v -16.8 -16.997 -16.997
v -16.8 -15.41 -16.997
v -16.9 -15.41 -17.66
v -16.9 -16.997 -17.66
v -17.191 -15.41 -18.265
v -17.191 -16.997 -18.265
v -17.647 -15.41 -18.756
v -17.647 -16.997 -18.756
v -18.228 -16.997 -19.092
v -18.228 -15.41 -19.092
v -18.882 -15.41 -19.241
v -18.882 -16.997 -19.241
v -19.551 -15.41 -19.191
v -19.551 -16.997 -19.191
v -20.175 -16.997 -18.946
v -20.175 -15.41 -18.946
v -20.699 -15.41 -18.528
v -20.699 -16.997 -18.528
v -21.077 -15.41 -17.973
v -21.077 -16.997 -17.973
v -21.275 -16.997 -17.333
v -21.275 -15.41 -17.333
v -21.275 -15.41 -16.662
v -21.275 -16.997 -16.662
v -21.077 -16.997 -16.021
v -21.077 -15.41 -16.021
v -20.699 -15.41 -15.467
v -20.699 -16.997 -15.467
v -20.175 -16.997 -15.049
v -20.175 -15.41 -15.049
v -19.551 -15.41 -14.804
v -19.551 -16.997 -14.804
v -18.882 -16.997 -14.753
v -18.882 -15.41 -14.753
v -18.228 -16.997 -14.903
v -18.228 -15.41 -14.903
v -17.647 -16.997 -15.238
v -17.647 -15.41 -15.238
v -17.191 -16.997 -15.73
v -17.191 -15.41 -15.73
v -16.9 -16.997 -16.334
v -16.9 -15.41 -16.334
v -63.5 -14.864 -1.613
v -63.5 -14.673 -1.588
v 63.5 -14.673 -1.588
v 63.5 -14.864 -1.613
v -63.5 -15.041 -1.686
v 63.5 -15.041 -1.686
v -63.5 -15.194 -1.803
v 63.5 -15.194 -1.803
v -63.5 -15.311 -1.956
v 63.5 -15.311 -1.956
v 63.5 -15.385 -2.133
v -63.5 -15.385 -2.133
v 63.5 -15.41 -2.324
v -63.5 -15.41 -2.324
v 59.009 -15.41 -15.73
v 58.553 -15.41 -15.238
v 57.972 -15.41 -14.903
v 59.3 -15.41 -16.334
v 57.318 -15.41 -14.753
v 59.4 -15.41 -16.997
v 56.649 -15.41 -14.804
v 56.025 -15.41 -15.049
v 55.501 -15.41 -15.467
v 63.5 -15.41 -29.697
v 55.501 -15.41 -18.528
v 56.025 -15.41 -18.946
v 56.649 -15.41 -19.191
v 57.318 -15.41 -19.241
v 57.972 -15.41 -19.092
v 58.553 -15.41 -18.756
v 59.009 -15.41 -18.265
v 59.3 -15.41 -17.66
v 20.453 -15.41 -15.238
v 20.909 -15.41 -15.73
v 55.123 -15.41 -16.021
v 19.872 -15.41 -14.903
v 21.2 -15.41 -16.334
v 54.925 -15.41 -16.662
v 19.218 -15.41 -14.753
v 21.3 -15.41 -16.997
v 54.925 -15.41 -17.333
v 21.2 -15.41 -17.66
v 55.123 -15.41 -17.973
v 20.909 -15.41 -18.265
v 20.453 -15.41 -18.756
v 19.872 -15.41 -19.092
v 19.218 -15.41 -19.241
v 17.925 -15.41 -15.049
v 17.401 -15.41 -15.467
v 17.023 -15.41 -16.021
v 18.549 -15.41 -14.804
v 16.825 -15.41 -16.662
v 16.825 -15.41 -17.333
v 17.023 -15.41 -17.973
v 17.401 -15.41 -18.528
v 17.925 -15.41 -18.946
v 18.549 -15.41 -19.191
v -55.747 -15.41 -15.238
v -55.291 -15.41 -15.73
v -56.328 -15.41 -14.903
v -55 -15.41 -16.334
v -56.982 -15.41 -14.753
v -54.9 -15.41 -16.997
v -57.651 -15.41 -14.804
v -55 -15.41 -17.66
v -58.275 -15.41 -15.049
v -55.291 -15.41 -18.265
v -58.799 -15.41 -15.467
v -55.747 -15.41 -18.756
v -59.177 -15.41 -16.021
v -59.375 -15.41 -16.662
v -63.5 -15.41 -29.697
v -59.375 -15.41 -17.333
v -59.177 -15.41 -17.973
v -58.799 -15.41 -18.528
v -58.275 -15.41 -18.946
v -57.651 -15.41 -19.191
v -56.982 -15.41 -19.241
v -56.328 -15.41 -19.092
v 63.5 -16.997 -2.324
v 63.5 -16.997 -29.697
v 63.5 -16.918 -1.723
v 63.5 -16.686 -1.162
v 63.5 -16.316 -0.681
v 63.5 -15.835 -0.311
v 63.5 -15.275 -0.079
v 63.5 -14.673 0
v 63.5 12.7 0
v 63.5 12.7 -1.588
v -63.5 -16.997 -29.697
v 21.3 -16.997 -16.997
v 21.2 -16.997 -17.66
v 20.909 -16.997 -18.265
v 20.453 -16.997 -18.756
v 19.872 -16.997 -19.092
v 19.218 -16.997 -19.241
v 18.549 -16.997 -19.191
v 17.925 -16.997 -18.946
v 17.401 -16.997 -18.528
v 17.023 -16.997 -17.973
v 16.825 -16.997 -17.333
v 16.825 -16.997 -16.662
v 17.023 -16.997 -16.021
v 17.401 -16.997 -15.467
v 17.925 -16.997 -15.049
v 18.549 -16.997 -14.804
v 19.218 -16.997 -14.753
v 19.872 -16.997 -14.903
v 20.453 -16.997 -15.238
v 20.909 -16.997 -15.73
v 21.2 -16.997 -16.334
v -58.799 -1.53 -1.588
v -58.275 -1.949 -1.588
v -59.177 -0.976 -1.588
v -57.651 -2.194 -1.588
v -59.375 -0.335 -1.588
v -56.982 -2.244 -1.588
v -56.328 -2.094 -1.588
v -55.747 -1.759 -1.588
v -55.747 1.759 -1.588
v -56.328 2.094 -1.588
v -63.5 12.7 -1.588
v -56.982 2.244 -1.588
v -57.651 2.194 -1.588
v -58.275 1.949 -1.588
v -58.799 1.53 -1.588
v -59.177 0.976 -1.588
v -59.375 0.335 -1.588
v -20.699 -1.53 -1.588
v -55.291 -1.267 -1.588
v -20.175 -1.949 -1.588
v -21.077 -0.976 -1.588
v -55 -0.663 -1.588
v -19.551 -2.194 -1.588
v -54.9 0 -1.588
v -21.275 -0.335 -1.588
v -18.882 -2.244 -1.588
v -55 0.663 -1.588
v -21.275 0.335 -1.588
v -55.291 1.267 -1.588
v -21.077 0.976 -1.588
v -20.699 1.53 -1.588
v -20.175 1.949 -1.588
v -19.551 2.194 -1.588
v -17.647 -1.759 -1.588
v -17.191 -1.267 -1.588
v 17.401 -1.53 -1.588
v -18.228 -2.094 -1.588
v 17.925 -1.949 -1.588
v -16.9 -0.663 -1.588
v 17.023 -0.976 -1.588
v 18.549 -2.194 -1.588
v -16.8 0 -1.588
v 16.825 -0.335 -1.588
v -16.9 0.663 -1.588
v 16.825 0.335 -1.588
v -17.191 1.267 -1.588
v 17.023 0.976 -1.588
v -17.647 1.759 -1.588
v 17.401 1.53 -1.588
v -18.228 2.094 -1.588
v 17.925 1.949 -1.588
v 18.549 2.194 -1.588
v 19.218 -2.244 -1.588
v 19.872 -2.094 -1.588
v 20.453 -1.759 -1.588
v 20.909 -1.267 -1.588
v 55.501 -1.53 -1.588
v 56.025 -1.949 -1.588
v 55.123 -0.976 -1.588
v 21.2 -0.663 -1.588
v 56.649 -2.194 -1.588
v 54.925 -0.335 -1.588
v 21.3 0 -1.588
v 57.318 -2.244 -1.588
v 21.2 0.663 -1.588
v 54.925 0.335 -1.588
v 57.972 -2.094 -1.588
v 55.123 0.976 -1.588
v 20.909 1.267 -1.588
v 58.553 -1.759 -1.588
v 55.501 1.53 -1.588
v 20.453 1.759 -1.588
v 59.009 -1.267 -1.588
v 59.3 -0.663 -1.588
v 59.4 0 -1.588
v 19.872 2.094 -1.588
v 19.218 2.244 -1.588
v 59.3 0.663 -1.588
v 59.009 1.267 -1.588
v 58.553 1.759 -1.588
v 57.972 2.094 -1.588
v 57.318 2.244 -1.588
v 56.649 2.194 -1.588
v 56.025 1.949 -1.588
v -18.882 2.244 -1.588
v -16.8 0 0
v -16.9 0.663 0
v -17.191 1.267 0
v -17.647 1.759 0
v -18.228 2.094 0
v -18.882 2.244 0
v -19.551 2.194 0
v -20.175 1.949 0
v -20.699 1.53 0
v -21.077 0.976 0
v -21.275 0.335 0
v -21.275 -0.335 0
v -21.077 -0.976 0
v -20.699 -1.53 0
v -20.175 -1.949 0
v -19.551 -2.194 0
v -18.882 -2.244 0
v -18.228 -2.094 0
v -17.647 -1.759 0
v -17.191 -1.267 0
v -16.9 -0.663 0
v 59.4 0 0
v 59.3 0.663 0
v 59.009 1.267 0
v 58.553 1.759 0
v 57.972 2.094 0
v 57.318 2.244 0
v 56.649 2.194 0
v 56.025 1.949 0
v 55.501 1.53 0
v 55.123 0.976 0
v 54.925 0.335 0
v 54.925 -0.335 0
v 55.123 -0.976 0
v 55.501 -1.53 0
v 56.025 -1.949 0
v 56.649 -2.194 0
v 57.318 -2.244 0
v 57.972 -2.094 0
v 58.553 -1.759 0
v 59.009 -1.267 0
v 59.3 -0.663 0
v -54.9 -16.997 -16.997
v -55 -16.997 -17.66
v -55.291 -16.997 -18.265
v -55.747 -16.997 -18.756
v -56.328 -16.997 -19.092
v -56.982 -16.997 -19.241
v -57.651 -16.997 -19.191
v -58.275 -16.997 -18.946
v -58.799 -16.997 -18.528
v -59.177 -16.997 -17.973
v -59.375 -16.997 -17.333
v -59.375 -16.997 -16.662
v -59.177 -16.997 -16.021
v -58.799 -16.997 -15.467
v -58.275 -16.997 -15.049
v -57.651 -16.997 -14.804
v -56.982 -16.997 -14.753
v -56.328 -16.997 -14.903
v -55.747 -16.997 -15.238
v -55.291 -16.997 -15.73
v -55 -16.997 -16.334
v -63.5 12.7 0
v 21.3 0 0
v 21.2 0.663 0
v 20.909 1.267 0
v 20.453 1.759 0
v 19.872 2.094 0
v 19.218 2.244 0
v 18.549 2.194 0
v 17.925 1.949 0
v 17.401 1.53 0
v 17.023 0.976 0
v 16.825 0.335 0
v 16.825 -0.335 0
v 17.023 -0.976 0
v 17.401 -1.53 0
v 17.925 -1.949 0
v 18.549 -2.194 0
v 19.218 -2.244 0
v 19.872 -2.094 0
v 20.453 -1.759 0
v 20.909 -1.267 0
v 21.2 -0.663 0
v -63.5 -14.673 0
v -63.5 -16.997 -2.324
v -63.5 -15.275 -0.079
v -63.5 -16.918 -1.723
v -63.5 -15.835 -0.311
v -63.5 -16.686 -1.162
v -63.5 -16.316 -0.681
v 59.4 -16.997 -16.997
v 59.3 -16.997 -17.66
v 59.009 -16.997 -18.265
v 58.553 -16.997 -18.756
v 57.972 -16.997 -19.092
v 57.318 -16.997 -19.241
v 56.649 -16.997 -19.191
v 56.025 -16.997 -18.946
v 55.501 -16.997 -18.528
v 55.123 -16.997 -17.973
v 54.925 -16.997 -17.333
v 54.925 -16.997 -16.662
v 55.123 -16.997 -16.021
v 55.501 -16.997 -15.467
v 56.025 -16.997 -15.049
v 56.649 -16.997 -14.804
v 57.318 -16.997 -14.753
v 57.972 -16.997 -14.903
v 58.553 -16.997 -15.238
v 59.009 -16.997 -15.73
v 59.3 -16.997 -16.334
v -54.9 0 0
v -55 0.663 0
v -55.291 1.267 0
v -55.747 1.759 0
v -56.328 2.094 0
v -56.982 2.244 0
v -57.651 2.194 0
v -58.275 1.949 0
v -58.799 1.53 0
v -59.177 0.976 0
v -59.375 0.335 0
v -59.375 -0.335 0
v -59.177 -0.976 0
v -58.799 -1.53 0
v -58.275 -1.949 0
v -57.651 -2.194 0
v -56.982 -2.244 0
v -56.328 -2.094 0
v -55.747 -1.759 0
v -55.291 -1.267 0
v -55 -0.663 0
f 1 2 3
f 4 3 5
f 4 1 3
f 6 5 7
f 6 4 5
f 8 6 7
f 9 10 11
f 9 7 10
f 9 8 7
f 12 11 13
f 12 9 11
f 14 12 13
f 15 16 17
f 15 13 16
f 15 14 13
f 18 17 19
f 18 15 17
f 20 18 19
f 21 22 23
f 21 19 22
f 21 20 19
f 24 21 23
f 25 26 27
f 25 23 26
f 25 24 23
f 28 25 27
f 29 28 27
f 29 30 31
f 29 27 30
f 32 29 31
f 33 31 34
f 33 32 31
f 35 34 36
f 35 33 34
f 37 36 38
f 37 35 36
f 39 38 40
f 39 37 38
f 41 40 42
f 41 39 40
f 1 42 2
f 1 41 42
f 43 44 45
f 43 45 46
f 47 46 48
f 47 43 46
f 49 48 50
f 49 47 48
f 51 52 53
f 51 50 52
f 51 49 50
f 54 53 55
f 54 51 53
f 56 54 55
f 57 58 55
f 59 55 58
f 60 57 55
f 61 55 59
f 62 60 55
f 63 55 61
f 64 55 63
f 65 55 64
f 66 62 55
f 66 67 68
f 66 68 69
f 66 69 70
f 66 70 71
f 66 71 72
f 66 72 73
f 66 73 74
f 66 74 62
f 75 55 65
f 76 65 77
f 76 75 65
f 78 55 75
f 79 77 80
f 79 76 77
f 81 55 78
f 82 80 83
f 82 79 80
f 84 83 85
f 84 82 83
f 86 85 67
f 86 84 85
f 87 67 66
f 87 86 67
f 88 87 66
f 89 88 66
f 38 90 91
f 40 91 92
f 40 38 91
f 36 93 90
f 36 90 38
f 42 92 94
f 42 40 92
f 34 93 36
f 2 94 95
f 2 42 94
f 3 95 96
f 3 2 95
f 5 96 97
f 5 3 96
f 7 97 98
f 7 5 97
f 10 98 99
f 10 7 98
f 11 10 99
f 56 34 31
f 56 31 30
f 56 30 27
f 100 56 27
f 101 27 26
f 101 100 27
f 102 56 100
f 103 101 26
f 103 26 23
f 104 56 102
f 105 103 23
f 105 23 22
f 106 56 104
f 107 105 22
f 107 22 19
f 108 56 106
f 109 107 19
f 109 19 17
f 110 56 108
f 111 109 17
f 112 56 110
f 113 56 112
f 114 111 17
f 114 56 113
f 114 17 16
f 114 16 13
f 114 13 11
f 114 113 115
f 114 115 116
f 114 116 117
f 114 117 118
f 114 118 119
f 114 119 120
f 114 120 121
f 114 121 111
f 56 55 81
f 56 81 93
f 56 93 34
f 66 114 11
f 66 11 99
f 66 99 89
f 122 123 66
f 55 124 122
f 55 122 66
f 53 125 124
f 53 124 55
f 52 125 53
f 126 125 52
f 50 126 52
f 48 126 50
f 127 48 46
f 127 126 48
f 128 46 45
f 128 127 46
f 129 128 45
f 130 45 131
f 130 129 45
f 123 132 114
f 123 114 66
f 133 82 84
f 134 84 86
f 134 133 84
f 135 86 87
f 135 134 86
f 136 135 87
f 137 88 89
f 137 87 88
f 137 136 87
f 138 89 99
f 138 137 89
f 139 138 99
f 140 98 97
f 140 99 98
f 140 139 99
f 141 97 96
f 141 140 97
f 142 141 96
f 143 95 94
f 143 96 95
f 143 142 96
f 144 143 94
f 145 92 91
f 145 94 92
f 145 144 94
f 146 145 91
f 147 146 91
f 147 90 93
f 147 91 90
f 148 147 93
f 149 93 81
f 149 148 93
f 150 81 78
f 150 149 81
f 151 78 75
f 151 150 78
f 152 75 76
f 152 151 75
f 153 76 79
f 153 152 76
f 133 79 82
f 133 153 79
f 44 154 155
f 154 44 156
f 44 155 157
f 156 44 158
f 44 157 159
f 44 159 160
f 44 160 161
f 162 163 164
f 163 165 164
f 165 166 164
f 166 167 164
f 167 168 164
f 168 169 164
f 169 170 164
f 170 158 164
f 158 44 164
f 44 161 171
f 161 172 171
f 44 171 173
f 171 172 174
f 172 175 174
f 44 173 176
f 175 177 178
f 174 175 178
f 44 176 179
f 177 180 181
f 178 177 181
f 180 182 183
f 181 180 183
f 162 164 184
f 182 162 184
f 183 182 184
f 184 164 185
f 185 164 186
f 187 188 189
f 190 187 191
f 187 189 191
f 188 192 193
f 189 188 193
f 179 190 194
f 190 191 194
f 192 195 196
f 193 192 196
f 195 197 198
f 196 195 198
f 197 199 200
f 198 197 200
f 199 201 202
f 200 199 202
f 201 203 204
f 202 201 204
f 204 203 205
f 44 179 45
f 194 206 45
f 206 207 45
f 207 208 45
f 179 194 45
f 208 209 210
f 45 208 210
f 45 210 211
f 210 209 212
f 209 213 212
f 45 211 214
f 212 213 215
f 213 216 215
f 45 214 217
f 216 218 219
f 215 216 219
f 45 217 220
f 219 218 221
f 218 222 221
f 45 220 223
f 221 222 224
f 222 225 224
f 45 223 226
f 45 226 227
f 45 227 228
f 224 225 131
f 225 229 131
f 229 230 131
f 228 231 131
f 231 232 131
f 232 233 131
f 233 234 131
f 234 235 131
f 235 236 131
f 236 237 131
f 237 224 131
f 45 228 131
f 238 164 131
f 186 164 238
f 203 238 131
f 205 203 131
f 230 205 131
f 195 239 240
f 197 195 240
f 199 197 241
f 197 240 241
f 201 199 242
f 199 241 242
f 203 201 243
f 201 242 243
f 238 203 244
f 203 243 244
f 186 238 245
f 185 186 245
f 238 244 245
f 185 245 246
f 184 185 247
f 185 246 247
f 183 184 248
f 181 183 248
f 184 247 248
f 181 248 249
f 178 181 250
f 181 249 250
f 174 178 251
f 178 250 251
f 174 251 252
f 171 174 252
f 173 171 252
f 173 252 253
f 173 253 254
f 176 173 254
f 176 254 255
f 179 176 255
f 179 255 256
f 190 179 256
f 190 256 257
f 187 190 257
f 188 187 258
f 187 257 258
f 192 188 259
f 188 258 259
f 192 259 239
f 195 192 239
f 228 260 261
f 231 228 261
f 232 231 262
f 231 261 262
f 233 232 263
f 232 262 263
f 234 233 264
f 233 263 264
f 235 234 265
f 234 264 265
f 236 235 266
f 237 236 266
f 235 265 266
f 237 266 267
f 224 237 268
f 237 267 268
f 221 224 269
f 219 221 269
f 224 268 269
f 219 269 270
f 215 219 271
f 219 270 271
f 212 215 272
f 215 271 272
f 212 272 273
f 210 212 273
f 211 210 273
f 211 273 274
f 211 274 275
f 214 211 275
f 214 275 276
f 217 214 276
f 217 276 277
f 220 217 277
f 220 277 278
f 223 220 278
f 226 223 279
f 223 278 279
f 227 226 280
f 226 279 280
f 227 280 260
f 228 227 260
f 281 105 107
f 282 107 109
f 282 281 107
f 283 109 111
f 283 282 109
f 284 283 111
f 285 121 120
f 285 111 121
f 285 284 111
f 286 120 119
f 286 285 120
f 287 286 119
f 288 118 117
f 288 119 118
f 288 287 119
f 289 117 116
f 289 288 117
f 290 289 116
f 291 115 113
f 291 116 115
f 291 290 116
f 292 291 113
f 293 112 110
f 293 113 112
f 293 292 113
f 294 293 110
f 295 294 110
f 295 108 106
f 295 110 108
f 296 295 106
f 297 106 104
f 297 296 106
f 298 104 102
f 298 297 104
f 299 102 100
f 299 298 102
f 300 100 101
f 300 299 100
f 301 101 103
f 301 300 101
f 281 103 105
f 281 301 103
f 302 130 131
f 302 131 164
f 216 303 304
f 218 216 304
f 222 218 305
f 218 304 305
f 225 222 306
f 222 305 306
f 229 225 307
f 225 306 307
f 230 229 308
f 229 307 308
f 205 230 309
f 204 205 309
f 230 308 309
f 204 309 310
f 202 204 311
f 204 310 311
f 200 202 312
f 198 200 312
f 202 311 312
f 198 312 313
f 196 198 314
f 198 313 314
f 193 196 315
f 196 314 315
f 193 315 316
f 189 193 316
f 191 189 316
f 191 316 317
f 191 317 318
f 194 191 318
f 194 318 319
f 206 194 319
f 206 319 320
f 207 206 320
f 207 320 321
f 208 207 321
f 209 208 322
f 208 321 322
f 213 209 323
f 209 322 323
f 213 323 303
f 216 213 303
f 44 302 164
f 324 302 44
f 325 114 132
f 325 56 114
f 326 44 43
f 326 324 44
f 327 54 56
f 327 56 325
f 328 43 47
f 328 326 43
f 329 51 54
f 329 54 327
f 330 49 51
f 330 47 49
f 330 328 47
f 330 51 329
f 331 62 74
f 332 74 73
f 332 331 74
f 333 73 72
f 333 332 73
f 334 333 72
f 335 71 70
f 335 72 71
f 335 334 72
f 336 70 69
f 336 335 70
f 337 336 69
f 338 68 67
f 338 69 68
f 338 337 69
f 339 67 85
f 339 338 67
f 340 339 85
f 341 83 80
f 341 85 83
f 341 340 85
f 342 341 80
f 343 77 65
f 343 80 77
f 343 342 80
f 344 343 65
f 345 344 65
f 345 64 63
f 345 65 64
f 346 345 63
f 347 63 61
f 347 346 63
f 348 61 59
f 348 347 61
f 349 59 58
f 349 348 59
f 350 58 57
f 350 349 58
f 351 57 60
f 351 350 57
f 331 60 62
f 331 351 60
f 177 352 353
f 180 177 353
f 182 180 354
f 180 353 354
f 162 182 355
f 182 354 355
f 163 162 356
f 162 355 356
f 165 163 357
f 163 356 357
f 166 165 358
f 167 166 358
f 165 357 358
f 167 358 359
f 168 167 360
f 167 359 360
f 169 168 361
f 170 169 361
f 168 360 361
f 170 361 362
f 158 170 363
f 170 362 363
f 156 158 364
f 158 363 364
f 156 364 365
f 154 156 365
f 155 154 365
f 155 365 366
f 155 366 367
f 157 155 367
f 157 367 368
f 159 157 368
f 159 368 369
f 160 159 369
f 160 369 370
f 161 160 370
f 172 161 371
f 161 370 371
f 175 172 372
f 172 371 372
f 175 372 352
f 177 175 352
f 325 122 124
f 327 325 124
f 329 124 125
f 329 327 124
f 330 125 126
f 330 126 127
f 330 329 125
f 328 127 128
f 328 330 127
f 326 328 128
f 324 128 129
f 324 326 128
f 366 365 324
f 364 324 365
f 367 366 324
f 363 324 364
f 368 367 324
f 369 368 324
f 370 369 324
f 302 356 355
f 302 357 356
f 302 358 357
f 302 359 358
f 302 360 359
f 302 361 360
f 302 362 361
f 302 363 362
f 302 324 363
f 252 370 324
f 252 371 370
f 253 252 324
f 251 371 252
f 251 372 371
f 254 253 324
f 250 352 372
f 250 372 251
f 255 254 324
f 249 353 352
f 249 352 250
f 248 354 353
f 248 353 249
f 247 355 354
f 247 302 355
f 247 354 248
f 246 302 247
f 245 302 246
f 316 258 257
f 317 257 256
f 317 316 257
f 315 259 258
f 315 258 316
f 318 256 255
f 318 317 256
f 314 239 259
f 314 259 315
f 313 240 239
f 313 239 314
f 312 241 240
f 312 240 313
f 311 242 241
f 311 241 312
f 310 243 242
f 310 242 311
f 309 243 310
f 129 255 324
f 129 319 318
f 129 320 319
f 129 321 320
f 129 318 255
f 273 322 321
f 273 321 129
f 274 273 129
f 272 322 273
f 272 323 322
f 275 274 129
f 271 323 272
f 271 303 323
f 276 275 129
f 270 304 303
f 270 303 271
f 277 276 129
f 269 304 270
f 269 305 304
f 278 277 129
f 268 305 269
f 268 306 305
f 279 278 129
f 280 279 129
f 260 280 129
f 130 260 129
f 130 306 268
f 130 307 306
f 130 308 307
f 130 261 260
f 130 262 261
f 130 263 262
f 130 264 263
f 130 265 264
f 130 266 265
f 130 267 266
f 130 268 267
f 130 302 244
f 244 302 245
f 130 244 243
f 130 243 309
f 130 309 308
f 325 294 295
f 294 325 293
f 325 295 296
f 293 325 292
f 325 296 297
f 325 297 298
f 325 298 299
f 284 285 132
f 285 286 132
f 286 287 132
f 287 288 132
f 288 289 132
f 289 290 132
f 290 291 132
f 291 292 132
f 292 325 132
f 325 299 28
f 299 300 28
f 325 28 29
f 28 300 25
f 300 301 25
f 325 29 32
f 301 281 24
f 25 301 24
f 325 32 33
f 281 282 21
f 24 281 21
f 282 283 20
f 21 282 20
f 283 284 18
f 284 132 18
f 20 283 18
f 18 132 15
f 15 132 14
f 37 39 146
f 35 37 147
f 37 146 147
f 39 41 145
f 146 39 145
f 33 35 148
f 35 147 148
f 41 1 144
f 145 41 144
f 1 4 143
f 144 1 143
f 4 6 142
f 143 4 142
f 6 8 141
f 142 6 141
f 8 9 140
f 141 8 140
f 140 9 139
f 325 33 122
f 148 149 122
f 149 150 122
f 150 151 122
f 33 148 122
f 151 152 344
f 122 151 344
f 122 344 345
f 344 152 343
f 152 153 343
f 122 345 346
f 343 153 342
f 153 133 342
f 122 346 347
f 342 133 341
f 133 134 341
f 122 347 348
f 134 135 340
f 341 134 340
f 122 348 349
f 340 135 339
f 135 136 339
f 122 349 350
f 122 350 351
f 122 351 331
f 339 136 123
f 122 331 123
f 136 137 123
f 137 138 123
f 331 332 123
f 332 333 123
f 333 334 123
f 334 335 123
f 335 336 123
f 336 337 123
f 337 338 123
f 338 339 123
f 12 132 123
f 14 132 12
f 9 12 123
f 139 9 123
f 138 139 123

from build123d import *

# Parameters (mm, degrees)
SKETCH1_R                  = 2.25
BASE_FLANGE1_DEPTH         = 1.5875
SKETCHED_START             = -44.45
SKETCHED_BEND1_OUTLINE_W   = 127
SKETCHED_BEND1_OUTLINE_H   = 1.5875
SKETCHED_BEND1_DEPTH       = 27.452834079
SKETCHED_START_2           = -16.777817363
SKETCHED_BEND1_2_OUTLINE_W = 127
SKETCHED_BEND1_2_OUTLINE_H = 28.109665921
SKETCHED_BEND1_2_OUTLINE_R = 2.25
SKETCHED_BEND1_2_DEPTH     = 1.368151442
SKETCHED_START_3           = -16.997165921
SKETCHED_BEND1_3_OUTLINE_W = 127
SKETCHED_BEND1_3_OUTLINE_H = 28.109665921
SKETCHED_BEND1_3_OUTLINE_R = 2.25
SKETCHED_BEND1_3_DEPTH     = 2.3241
SKETCHED_START_4           = -64
SKETCHED_BEND1_4_DEPTH     = 128


with BuildPart() as part:
    # Base-Flange1: sheet metal written as solids
    # Sketch1 → Base-Flange1 (new body)
    with BuildSketch(Plane.XY):
        Polygon((63.5, -12.7), (63.5, 12.7), (-63.5, 12.7), (-63.5, -12.7), (-63.5, -19.05), (-63.5, -44.45), (63.5, -44.45), (63.5, -19.05), align=None)
        with Locations((-57.15, 0)):
            Circle(SKETCH1_R, mode=Mode.SUBTRACT)
        with Locations((-19.05, 0)):
            Circle(SKETCH1_R, mode=Mode.SUBTRACT)
        with Locations((19.05, 0)):
            Circle(SKETCH1_R, mode=Mode.SUBTRACT)
        with Locations((57.15, 0)):
            Circle(SKETCH1_R, mode=Mode.SUBTRACT)
        with Locations(Location((57.15, -31.75, 0), (0, 0, 180))):
            Circle(SKETCH1_R, mode=Mode.SUBTRACT)
        with Locations(Location((19.05, -31.75, 0), (0, 0, 180))):
            Circle(SKETCH1_R, mode=Mode.SUBTRACT)
        with Locations(Location((-19.05, -31.75, 0), (0, 0, 180))):
            Circle(SKETCH1_R, mode=Mode.SUBTRACT)
        with Locations(Location((-57.15, -31.75, 0), (0, 0, 180))):
            Circle(SKETCH1_R, mode=Mode.SUBTRACT)
    extrude(amount=-BASE_FLANGE1_DEPTH)

    # Sketched Bend1: read off the stored shape, not the designer's step
    # Sketched Bend1 outline → Sketched Bend1 (cut)
    with BuildSketch(Plane(origin=(0, 0, 0), x_dir=(1, 0, 0), z_dir=(0, 1, 0)).offset(SKETCHED_START)):
        with Locations((0, 0.79375)):
            Rectangle(SKETCHED_BEND1_OUTLINE_W, SKETCHED_BEND1_OUTLINE_H)
    extrude(amount=SKETCHED_BEND1_DEPTH, mode=Mode.SUBTRACT)

    # Sketched Bend1 2 outline → Sketched Bend1 2 (add)
    with BuildSketch(Plane(origin=(0, 0, 0), x_dir=(1, 0, 0), z_dir=(0, 1, 0)).offset(SKETCHED_START_2)):
        with Locations((0, 15.642332961)):
            Rectangle(SKETCHED_BEND1_2_OUTLINE_W, SKETCHED_BEND1_2_OUTLINE_H)
        with Locations((-57.15, 16.997165921)):
            Circle(SKETCHED_BEND1_2_OUTLINE_R, mode=Mode.SUBTRACT)
        with Locations((-19.05, 16.997165921)):
            Circle(SKETCHED_BEND1_2_OUTLINE_R, mode=Mode.SUBTRACT)
        with Locations((19.05, 16.997165921)):
            Circle(SKETCHED_BEND1_2_OUTLINE_R, mode=Mode.SUBTRACT)
        with Locations((57.15, 16.997165921)):
            Circle(SKETCHED_BEND1_2_OUTLINE_R, mode=Mode.SUBTRACT)
    extrude(amount=SKETCHED_BEND1_2_DEPTH)

    # Sketched Bend1 3 outline → Sketched Bend1 3 (add)
    with BuildSketch(Plane(origin=(0, 0, 0), x_dir=(1, 0, 0), z_dir=(0, 1, 0)).offset(SKETCHED_START_3)):
        with Locations((0, 15.642332961)):
            Rectangle(SKETCHED_BEND1_3_OUTLINE_W, SKETCHED_BEND1_3_OUTLINE_H)
        with Locations((-57.15, 16.997165921)):
            Circle(SKETCHED_BEND1_3_OUTLINE_R, mode=Mode.SUBTRACT)
        with Locations((-19.05, 16.997165921)):
            Circle(SKETCHED_BEND1_3_OUTLINE_R, mode=Mode.SUBTRACT)
        with Locations((19.05, 16.997165921)):
            Circle(SKETCHED_BEND1_3_OUTLINE_R, mode=Mode.SUBTRACT)
        with Locations((57.15, 16.997165921)):
            Circle(SKETCHED_BEND1_3_OUTLINE_R, mode=Mode.SUBTRACT)
    extrude(amount=SKETCHED_BEND1_3_DEPTH)

    # Sketched Bend1 4 outline → Sketched Bend1 4 (cut)
    with BuildSketch(Plane.YZ.offset(SKETCHED_START_4)):
        with BuildLine():
            ThreePointArc((-14.673065921, -1.5875), (-15.193920776, -1.803245145), (-15.409665921, -2.3241))
            Line((-15.409665921, -2.3241), (-15.409665921, -29.697165921))
            Line((-15.409665921, -29.697165921), (-14.673065921, -29.697165921))
            Line((-14.673065921, -29.697165921), (-14.673065921, -1.5875))
        make_face()
        with BuildLine():
            Line((-16.997165921, 0), (-16.997165921, -2.3241))
            ThreePointArc((-16.997165921, -2.3241), (-16.316452791, -0.68071313), (-14.673065921, 0))
            Line((-14.673065921, 0), (-16.997165921, 0))
        make_face()
    extrude(amount=SKETCHED_BEND1_4_DEPTH, mode=Mode.SUBTRACT)


solid = part.part
